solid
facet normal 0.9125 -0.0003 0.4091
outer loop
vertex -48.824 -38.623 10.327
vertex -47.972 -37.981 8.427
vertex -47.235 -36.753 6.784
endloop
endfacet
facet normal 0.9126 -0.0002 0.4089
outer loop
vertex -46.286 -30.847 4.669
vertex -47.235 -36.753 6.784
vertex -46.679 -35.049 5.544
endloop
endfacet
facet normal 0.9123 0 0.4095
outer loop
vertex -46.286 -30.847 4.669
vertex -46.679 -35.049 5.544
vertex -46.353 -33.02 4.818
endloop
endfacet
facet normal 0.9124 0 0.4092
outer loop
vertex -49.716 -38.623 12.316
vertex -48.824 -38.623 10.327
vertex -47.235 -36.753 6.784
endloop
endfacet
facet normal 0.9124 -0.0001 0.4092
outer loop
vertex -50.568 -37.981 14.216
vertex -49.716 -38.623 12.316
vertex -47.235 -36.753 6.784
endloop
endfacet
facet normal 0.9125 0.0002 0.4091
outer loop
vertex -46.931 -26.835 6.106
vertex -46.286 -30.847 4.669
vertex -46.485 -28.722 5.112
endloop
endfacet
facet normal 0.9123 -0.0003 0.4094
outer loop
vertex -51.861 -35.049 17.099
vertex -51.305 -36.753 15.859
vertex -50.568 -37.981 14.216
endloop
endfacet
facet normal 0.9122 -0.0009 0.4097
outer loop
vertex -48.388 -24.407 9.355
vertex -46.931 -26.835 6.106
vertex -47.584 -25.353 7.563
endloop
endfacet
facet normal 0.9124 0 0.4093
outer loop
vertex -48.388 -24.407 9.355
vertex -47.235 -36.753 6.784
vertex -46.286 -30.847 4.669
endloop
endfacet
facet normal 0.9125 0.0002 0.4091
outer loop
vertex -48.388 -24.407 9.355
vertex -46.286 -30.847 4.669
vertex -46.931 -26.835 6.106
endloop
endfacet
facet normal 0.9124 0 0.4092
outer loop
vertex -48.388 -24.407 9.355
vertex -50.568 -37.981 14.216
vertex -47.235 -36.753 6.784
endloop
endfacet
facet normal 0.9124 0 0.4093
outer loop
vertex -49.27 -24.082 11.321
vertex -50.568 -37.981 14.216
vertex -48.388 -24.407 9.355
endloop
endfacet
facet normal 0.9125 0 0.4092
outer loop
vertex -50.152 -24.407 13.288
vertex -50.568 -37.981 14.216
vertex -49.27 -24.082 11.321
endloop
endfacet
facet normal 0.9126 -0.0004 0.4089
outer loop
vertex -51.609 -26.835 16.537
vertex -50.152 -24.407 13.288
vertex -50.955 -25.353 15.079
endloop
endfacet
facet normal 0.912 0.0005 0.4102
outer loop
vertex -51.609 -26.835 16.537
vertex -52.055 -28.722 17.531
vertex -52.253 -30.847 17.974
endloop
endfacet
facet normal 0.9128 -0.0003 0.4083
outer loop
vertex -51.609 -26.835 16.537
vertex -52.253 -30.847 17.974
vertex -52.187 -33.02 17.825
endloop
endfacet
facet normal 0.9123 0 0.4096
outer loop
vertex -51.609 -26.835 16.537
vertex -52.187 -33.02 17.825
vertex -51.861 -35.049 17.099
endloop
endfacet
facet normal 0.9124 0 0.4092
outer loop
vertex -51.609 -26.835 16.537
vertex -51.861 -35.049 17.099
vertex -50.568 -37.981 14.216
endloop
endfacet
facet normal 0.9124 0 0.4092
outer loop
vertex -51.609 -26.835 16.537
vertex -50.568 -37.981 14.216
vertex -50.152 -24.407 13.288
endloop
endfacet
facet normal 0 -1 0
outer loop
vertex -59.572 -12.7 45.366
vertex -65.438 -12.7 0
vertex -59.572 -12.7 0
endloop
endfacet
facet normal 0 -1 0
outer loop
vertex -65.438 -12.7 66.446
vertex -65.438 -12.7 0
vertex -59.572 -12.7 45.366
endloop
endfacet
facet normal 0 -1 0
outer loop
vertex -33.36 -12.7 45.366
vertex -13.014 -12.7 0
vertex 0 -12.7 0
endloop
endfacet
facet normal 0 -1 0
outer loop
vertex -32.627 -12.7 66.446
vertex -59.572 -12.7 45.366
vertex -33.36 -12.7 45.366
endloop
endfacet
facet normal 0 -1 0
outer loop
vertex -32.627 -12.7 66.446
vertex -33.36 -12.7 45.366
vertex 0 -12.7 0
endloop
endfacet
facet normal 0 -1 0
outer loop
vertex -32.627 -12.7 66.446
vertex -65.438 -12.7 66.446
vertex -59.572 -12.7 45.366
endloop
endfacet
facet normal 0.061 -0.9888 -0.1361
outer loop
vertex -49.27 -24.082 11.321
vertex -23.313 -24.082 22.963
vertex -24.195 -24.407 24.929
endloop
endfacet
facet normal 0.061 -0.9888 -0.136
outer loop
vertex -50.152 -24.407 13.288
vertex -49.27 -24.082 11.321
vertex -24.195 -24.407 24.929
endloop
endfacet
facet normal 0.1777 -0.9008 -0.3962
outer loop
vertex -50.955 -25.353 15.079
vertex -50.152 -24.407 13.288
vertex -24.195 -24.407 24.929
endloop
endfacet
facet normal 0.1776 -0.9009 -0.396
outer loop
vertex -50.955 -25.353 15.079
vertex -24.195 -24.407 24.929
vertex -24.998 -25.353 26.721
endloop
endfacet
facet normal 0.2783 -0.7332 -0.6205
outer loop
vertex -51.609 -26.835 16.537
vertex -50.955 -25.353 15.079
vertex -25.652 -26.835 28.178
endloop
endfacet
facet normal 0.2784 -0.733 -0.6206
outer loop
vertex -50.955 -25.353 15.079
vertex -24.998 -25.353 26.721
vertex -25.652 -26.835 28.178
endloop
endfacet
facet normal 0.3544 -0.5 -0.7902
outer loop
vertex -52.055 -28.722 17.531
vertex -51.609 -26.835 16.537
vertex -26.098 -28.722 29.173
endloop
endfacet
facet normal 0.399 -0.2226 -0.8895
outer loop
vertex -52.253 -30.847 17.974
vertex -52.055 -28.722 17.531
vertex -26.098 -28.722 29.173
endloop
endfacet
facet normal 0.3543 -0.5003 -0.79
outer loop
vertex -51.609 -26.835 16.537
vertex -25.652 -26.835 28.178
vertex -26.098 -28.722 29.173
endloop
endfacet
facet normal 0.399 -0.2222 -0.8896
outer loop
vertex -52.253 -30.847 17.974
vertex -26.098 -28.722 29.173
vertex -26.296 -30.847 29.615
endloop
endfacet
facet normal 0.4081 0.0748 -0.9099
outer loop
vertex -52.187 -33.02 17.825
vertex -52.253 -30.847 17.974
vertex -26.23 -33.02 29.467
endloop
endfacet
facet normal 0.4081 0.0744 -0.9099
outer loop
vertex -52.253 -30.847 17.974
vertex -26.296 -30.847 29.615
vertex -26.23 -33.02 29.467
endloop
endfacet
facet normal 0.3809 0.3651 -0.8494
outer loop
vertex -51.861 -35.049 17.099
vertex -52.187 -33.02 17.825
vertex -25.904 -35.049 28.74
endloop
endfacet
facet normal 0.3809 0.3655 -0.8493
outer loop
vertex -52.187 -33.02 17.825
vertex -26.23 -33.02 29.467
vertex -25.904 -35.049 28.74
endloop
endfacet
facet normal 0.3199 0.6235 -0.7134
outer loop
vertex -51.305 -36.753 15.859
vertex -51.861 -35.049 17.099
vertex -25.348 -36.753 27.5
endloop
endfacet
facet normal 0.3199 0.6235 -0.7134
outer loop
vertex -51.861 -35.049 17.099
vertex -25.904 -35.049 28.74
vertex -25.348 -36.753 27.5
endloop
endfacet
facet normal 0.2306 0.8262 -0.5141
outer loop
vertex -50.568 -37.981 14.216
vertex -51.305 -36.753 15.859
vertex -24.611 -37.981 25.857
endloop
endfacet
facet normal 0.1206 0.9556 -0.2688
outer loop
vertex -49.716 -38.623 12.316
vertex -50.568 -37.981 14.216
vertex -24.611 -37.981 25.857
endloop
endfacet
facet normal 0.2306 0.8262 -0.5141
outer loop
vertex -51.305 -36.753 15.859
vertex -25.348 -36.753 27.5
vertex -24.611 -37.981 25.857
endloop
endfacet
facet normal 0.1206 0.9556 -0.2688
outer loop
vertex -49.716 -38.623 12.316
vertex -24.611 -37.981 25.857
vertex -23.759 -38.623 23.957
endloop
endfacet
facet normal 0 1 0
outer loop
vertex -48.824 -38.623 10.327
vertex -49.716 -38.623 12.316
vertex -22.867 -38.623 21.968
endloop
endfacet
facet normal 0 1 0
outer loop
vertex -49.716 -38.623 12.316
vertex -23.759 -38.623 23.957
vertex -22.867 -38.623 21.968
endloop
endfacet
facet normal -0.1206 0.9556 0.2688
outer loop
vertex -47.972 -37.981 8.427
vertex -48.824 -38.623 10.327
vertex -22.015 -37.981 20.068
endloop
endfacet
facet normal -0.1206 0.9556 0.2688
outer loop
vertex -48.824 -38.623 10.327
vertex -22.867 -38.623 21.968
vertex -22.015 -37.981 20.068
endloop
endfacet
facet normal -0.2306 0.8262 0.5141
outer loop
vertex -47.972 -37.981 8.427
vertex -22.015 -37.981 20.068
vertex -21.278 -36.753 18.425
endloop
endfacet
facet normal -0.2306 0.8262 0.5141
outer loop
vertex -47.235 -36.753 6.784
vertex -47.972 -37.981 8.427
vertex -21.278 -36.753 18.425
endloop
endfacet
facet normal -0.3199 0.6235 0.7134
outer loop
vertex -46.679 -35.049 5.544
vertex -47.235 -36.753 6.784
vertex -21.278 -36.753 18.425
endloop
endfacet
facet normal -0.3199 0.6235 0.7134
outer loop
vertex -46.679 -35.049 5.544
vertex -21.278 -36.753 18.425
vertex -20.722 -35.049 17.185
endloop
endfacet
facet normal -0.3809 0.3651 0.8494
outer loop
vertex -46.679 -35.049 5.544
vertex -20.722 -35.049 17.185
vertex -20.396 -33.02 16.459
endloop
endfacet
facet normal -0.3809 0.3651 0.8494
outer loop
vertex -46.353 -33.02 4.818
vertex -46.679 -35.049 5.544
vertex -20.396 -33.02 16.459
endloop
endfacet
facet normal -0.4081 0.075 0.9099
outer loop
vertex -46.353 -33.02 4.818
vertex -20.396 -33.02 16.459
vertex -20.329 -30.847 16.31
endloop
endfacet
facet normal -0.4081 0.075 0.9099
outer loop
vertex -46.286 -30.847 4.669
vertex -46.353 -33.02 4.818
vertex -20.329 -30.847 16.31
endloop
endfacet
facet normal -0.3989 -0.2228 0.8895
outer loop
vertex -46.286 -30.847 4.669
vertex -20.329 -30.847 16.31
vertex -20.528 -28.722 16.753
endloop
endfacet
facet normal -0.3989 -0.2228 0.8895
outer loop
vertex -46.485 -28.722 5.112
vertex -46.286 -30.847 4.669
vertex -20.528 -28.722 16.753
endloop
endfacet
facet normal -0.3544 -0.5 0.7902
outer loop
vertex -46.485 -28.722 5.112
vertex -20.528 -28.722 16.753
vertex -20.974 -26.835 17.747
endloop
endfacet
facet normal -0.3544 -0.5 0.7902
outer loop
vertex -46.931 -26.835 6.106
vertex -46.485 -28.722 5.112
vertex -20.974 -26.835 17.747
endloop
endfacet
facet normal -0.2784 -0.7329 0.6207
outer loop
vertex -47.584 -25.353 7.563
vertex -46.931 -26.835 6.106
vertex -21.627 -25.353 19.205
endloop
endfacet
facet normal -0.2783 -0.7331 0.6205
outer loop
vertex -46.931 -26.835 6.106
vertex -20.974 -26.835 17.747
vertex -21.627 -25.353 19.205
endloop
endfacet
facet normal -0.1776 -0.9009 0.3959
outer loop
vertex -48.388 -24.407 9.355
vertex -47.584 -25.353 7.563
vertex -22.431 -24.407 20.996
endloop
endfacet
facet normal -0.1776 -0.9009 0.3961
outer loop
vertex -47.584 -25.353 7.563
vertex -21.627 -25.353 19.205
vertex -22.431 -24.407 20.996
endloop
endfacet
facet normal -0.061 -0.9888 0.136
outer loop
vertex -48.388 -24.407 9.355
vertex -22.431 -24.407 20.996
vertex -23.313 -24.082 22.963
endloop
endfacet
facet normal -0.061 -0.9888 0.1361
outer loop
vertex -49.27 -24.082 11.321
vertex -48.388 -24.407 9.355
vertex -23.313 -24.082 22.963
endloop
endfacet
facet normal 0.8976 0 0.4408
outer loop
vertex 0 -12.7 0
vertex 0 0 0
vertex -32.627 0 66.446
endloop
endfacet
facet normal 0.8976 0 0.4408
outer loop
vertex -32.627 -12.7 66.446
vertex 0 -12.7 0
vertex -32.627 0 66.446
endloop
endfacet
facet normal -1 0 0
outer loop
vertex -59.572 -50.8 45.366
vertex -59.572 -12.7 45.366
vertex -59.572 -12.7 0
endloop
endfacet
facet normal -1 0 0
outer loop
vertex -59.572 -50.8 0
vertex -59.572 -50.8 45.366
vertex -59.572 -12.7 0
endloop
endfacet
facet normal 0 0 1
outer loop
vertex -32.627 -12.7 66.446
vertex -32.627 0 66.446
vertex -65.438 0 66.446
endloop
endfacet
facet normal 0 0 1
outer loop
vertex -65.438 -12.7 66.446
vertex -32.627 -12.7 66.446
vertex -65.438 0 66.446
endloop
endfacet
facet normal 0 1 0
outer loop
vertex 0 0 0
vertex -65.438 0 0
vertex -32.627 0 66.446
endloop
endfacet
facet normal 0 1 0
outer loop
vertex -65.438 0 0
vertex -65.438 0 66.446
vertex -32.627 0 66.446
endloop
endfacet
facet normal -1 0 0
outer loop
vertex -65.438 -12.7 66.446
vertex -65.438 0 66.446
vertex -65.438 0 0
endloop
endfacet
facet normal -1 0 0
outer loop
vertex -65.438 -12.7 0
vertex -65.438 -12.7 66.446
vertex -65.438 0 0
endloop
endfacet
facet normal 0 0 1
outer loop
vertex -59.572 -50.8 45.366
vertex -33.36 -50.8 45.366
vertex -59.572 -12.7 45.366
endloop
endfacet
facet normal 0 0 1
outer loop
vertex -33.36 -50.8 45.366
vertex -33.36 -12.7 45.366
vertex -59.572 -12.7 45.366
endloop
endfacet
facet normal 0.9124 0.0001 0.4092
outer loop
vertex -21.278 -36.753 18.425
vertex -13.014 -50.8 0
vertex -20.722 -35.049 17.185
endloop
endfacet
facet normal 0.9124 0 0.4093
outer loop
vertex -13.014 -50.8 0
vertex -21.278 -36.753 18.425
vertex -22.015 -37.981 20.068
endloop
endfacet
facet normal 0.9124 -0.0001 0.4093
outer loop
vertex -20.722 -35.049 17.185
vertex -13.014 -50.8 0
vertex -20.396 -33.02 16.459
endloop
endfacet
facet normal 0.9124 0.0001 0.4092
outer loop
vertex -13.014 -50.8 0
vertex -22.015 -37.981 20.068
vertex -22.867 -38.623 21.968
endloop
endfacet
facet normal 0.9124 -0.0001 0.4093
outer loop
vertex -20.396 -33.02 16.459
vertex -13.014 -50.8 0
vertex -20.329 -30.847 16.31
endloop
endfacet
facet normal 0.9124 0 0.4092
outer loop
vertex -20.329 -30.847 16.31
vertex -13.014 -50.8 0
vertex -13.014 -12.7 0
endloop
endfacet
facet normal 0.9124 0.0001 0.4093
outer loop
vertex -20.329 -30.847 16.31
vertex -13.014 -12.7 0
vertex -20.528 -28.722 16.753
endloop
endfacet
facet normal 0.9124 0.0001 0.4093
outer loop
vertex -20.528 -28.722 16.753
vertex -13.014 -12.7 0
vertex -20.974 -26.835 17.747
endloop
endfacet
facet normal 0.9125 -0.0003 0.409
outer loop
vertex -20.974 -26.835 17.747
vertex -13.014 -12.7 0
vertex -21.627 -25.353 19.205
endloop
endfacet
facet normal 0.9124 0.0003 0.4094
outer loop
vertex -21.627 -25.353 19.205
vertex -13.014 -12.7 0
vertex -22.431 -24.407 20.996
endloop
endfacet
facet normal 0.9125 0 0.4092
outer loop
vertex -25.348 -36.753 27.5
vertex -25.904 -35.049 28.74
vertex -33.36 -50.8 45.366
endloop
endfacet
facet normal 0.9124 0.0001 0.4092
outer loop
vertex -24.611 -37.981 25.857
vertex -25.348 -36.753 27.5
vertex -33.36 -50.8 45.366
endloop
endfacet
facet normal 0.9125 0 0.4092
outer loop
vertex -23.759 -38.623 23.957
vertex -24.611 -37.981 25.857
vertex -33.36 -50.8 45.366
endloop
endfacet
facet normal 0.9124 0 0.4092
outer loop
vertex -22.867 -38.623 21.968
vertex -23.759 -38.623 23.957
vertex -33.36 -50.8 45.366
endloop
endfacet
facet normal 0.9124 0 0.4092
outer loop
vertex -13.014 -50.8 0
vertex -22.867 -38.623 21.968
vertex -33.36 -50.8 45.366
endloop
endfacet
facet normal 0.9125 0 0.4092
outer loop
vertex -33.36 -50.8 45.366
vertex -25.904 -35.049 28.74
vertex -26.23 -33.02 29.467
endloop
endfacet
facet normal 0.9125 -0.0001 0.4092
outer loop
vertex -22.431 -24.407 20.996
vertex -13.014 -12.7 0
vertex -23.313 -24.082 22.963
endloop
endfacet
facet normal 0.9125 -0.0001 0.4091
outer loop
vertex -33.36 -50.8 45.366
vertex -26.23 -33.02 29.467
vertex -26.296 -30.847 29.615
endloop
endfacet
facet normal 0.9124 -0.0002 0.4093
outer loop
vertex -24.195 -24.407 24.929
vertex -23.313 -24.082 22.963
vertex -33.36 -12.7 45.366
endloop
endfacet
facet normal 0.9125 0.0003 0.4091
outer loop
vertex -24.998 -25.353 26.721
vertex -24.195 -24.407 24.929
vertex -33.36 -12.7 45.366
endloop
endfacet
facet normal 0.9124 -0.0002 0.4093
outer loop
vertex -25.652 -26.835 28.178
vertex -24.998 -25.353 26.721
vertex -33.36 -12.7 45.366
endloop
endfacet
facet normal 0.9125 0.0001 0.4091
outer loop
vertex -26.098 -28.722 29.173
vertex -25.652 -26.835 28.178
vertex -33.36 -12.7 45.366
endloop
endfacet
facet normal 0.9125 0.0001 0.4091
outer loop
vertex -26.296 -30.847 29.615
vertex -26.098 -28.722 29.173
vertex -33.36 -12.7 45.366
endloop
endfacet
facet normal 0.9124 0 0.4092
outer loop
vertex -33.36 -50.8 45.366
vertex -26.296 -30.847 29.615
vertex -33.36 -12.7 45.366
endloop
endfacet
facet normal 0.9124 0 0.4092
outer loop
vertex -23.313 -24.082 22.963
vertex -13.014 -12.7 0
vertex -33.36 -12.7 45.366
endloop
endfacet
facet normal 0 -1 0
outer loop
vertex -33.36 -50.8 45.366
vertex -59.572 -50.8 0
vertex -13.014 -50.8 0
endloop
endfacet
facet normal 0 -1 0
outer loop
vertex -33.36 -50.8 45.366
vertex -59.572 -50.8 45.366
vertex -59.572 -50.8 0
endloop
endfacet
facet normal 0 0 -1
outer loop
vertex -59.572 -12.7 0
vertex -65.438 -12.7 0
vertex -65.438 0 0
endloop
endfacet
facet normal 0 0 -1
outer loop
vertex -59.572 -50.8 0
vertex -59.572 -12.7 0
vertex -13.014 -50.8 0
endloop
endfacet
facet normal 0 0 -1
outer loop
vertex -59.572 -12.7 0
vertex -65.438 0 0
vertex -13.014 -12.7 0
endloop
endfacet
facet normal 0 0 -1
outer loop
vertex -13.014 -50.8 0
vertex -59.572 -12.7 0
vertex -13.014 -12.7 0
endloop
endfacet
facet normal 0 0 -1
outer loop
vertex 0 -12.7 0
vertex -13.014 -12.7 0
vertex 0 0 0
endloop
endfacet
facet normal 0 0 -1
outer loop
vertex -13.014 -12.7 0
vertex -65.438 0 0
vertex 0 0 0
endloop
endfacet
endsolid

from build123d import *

# Parameters (mm, degrees)
F1_DEPTH = 12.7
F3_DEPTH = 25.4
F4_DEPTH = 12.7
F5_R     = 7.3111886468
F6_DEPTH = 28.448


with BuildPart() as f1:
    # F0 (on Front) → F1 (new body)
    with BuildSketch(Plane.XZ):
        Polygon((-65.437734127, 0), (0, 0), (-32.6272174716, 66.4458796382), (-65.437734127, 66.4458796382), align=None)
    extrude(amount=F1_DEPTH)

    # F2 (on face) → F3 (join)
    with BuildSketch(Plane.XZ.offset(12.7)):
        Polygon((-59.5721639693, 0), (-13.0142271519, 0), (-33.360414207, 45.3664921224), (-59.5721639693, 45.3664921224), align=None)
    extrude(amount=F3_DEPTH)

    # F4 (add): a face of the model
    f4_faces = [f1.faces().sort_by_distance(p)[0] for p in [
        (-40.9056812293, -38.1, 20.569190108),
    ]]
    extrude(f4_faces, amount=F4_DEPTH)

    # F5 (on face) → F6 (cut)
    with BuildSketch(Plane(origin=(-10.8349077523, 0, -4.8592926087), x_dir=(0, 1, 0), z_dir=(0.9124381131, 0, 0.4092147234))):
        with Locations((-31.3933752477, 30.4919779301)):
            Circle(F5_R)
    extrude(amount=-F6_DEPTH, mode=Mode.SUBTRACT)


solid = f1.part
